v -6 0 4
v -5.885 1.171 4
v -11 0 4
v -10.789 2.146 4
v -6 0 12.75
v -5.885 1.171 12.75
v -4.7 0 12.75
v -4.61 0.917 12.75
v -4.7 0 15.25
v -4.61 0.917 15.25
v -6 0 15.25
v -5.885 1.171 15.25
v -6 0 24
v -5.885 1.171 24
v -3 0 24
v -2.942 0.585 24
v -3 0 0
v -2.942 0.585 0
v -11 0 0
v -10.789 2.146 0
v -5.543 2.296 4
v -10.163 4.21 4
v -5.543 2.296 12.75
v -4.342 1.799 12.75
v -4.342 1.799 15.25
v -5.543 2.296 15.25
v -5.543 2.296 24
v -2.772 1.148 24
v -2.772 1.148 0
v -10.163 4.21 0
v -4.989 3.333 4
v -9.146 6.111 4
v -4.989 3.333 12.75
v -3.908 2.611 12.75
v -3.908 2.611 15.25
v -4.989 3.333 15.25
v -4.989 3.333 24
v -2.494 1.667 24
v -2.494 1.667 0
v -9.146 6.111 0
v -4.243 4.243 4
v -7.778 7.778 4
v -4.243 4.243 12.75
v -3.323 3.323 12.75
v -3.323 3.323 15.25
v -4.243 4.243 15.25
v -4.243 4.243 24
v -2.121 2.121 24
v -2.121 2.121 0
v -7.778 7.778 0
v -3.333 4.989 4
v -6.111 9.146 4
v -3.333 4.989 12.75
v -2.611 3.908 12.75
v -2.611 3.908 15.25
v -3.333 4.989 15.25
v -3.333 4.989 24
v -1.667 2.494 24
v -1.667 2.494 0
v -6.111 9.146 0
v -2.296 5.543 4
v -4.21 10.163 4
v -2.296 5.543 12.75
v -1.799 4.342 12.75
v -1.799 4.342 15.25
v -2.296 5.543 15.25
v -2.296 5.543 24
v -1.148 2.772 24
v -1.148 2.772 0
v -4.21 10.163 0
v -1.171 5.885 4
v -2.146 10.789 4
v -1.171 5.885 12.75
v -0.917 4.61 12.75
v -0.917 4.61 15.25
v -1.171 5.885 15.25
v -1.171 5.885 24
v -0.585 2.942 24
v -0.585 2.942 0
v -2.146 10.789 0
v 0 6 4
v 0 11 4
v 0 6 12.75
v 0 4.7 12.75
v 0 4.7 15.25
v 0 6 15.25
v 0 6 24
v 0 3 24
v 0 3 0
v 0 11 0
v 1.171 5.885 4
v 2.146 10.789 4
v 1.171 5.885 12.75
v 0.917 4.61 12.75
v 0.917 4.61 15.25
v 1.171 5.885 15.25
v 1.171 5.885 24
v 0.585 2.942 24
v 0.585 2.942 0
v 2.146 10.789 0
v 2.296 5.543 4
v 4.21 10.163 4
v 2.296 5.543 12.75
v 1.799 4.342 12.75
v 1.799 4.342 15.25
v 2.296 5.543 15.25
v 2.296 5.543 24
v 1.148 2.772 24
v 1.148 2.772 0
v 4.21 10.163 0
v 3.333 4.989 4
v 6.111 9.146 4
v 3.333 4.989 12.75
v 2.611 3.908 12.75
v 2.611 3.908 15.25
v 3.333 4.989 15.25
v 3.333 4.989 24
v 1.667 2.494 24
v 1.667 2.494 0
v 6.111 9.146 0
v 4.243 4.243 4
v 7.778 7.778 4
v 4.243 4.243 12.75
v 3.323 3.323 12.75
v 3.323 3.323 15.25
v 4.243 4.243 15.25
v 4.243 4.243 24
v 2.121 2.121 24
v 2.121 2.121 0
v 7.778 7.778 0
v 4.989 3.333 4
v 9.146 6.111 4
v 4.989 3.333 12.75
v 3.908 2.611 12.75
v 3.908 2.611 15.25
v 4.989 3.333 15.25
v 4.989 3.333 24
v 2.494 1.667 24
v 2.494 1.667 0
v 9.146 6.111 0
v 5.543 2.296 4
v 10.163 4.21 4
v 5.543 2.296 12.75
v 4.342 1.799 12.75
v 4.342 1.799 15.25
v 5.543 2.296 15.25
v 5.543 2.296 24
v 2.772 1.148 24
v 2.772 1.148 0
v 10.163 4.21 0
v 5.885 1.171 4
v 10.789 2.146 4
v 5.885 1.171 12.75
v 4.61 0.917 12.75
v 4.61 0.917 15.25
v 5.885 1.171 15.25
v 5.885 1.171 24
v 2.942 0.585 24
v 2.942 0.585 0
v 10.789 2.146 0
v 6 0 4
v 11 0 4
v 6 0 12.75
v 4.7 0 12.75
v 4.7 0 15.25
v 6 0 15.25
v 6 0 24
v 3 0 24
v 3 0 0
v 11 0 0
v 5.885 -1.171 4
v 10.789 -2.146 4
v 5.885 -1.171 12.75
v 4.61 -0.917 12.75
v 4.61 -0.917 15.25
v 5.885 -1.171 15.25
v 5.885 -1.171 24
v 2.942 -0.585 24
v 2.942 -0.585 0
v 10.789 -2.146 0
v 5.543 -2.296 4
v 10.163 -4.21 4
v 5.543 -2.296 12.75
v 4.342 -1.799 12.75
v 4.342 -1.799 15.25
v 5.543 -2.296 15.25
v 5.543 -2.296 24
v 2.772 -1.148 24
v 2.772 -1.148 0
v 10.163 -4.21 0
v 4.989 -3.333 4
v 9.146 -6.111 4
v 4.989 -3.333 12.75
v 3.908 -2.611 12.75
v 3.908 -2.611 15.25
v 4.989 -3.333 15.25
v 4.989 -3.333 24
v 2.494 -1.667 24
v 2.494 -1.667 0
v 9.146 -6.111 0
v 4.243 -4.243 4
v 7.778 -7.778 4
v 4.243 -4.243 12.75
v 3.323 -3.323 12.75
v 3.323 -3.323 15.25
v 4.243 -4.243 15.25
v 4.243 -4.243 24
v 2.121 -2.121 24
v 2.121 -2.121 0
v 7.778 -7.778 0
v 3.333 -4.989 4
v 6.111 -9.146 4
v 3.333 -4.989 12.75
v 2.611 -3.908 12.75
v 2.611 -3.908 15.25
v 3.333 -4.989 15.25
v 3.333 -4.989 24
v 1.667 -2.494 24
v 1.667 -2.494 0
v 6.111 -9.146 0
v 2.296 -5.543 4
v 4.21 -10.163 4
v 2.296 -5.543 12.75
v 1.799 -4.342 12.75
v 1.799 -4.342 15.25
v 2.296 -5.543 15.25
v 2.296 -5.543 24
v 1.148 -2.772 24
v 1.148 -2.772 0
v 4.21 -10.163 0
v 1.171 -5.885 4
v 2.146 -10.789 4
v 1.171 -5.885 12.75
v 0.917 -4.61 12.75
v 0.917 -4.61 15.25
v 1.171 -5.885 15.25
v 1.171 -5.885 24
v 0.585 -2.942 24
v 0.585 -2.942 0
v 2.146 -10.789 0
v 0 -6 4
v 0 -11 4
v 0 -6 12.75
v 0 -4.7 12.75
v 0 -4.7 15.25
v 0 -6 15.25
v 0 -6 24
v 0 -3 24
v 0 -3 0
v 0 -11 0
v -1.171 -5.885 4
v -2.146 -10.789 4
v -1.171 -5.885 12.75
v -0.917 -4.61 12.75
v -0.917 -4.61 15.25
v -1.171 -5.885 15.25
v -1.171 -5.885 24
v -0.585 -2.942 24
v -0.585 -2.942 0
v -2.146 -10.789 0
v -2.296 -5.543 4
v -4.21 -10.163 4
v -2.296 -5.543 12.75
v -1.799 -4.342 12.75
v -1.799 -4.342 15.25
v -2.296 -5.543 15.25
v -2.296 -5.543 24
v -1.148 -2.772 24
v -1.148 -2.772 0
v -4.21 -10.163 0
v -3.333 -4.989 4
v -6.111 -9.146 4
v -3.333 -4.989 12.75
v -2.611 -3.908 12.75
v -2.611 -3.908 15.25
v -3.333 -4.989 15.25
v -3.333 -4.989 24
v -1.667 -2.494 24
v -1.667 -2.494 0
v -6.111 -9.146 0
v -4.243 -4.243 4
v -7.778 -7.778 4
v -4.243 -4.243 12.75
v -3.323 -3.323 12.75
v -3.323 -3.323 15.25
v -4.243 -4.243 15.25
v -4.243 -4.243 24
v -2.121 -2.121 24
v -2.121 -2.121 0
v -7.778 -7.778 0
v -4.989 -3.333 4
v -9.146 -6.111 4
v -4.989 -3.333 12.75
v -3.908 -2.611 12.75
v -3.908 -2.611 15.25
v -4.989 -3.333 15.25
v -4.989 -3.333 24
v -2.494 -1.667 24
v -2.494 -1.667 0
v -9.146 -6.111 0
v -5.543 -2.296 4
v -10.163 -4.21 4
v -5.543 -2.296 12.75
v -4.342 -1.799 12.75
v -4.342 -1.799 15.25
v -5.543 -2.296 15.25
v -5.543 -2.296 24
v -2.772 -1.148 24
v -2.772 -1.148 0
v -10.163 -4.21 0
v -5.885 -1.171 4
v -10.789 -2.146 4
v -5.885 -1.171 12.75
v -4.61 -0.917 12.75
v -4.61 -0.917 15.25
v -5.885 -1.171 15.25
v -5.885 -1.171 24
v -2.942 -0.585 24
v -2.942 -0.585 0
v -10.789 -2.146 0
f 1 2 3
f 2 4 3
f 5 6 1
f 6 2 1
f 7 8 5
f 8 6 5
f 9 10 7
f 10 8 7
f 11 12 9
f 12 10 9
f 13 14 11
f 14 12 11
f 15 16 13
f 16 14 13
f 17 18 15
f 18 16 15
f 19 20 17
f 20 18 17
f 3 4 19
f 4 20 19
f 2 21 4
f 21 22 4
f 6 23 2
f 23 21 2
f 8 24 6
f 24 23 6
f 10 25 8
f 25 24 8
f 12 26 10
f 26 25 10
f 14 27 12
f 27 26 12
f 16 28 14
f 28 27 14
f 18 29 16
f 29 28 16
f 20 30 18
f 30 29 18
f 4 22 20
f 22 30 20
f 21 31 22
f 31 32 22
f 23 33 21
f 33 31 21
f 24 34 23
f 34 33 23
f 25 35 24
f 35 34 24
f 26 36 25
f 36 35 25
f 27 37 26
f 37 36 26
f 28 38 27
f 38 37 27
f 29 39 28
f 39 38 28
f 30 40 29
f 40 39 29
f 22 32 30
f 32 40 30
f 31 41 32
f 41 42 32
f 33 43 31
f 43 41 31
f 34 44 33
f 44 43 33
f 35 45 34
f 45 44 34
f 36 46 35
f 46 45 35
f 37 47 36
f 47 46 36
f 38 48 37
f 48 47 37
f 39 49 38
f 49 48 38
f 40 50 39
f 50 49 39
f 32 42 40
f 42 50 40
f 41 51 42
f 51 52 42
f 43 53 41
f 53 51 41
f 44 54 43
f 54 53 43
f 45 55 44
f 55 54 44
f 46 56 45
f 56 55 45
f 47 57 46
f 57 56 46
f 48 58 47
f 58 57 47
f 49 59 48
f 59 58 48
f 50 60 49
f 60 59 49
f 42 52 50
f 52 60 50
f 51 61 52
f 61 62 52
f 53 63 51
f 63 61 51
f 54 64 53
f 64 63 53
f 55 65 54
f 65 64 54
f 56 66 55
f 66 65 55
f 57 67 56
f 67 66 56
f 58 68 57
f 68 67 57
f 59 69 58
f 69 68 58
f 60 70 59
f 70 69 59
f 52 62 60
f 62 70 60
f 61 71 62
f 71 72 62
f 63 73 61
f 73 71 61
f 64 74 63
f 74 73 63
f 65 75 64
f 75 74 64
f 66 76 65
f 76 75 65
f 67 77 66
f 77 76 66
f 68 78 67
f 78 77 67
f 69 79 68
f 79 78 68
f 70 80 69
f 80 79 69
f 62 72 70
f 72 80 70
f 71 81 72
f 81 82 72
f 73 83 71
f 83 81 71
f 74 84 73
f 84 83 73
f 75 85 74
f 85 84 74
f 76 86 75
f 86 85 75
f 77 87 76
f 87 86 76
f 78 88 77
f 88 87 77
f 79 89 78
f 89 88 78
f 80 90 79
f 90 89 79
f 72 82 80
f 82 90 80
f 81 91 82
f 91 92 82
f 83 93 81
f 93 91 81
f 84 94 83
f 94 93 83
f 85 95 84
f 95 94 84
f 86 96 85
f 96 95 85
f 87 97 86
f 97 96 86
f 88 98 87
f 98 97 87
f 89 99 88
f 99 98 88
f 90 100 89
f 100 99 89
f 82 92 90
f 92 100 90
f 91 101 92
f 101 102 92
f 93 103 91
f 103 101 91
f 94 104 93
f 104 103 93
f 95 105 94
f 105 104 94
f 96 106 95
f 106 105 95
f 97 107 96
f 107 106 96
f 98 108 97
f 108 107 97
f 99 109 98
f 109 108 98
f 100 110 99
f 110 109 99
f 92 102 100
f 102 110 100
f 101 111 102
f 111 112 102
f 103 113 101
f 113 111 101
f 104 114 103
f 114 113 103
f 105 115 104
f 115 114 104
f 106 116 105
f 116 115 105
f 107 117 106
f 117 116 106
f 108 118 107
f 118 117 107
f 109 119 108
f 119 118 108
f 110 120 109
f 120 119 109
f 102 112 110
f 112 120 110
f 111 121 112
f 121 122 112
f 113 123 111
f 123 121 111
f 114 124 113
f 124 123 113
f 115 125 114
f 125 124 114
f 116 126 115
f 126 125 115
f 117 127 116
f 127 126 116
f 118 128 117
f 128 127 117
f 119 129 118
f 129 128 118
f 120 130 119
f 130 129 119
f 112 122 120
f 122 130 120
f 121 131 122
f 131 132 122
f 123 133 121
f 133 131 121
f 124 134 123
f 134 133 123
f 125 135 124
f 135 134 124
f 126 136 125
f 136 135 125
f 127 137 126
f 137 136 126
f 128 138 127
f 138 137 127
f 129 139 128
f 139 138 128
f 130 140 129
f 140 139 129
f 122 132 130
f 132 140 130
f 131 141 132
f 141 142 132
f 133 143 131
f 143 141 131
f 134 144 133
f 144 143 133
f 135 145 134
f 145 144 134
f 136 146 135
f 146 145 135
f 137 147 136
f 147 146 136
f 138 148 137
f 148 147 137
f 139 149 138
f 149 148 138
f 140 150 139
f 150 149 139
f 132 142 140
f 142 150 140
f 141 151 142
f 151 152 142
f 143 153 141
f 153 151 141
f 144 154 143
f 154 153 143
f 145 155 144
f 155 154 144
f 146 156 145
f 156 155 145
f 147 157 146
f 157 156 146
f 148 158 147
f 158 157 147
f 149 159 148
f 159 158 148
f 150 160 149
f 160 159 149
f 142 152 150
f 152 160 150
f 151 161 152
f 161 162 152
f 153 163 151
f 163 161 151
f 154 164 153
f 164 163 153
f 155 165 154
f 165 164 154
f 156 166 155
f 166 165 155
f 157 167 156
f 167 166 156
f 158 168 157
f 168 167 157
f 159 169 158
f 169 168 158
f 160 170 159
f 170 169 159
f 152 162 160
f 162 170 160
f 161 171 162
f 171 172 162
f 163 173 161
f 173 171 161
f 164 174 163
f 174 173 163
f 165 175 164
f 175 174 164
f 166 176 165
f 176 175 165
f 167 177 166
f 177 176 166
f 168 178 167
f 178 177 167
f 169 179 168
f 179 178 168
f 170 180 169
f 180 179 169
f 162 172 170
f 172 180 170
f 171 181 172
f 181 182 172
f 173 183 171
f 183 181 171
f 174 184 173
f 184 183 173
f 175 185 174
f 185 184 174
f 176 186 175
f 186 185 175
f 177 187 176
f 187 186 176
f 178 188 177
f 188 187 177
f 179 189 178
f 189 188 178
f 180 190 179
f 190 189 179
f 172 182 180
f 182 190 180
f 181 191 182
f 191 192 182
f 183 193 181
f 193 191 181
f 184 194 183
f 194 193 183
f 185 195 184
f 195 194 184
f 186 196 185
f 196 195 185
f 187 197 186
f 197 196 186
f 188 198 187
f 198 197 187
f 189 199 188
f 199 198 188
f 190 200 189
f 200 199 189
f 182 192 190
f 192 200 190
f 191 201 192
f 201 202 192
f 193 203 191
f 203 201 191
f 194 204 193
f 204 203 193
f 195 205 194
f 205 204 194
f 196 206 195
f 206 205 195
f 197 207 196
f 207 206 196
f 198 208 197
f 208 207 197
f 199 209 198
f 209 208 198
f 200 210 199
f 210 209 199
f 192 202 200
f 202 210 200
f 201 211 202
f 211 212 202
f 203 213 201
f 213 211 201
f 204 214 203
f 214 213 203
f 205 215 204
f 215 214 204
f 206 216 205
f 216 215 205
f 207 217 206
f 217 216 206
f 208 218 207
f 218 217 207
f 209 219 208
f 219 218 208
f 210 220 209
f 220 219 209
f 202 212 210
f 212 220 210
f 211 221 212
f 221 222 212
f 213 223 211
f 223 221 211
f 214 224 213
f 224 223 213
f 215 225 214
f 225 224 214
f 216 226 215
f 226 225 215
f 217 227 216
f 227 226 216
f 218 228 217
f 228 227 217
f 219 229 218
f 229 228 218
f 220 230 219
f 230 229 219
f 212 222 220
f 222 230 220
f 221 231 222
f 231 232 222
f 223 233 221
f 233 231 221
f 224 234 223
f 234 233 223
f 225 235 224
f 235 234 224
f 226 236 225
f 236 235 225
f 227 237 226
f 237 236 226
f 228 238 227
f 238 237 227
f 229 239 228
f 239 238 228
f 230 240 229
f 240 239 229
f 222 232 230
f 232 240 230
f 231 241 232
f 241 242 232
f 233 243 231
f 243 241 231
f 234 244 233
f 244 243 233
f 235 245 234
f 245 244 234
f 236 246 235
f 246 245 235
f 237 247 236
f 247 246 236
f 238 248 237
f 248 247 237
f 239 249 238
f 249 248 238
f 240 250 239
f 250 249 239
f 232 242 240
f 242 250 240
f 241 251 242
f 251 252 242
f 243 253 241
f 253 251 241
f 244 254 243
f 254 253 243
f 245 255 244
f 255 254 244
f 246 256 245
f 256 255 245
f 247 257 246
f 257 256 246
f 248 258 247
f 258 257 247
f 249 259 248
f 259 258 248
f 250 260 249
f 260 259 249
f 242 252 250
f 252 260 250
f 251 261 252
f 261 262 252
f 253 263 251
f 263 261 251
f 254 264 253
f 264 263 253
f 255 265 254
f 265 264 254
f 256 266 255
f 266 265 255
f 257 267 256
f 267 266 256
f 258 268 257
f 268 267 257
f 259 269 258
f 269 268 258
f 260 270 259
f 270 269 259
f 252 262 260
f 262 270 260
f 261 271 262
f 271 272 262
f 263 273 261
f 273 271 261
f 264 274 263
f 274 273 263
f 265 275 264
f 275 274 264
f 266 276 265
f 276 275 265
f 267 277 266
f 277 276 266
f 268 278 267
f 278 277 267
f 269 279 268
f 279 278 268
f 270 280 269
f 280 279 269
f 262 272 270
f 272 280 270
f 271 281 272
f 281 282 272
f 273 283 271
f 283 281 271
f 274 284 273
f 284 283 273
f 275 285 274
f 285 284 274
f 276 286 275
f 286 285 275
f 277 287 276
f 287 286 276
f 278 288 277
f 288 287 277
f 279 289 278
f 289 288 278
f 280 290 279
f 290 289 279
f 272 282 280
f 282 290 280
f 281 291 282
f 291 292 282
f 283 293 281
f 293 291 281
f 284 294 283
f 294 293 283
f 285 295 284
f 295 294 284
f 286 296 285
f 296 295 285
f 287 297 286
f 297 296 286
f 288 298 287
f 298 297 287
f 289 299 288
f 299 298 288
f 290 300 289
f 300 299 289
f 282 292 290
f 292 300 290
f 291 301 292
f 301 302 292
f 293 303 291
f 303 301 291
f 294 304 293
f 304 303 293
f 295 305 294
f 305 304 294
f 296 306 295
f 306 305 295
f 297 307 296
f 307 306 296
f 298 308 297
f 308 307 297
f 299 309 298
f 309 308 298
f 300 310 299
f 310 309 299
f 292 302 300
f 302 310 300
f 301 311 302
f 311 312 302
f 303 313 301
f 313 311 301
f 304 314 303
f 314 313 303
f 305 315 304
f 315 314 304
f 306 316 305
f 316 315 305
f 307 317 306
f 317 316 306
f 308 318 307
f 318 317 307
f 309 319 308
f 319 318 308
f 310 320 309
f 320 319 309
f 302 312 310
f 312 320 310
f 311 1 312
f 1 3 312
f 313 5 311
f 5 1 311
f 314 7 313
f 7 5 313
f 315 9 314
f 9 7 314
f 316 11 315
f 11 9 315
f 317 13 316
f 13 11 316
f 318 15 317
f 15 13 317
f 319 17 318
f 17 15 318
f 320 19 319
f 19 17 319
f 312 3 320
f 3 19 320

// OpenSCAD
$fn = 32;

// ----------------------------------------------------------------------
// Grooved revolve: flanged, bore R3
// ----------------------------------------------------------------------

// --- parameters (mm) ---
bore_r = 3;               // bore radius
outer_r = 6;              // outer radius of the body
total_h = 24;             // overall height, Z
wall = 3;                 // radial wall thickness
groove_w = 2.5;           // groove width
groove_d = 1.3;           // groove depth
grooves = 1;              // number of outer grooves
flange_r = 11;            // flange radius
flange_h = 4;             // flange height
fit_tol = 0.05;           // declared fit tolerance (prompt contract)
free_tol = 0.3;           // declared free tolerance (prompt contract)

bbox_x = 2 * flange_r;  // full diameter
bore_d = 2 * bore_r;  // bore diameter
body_d = 2 * outer_r;  // body diameter
flange_d = 2 * flange_r;  // flange diameter
revolve_angle = 360;  // full turn around the Z axis

profile = [[3, 0], [6, 0], [11, 0], [11, 4], [6, 4], [6, 12.75], [4.7, 12.75], [4.7, 15.25], [6, 15.25], [6, 24], [3, 24]];  // primary outline, 11 points, counter clockwise

// --- the one profile operation ---
rotate_extrude(angle = revolve_angle) polygon(points = profile);
